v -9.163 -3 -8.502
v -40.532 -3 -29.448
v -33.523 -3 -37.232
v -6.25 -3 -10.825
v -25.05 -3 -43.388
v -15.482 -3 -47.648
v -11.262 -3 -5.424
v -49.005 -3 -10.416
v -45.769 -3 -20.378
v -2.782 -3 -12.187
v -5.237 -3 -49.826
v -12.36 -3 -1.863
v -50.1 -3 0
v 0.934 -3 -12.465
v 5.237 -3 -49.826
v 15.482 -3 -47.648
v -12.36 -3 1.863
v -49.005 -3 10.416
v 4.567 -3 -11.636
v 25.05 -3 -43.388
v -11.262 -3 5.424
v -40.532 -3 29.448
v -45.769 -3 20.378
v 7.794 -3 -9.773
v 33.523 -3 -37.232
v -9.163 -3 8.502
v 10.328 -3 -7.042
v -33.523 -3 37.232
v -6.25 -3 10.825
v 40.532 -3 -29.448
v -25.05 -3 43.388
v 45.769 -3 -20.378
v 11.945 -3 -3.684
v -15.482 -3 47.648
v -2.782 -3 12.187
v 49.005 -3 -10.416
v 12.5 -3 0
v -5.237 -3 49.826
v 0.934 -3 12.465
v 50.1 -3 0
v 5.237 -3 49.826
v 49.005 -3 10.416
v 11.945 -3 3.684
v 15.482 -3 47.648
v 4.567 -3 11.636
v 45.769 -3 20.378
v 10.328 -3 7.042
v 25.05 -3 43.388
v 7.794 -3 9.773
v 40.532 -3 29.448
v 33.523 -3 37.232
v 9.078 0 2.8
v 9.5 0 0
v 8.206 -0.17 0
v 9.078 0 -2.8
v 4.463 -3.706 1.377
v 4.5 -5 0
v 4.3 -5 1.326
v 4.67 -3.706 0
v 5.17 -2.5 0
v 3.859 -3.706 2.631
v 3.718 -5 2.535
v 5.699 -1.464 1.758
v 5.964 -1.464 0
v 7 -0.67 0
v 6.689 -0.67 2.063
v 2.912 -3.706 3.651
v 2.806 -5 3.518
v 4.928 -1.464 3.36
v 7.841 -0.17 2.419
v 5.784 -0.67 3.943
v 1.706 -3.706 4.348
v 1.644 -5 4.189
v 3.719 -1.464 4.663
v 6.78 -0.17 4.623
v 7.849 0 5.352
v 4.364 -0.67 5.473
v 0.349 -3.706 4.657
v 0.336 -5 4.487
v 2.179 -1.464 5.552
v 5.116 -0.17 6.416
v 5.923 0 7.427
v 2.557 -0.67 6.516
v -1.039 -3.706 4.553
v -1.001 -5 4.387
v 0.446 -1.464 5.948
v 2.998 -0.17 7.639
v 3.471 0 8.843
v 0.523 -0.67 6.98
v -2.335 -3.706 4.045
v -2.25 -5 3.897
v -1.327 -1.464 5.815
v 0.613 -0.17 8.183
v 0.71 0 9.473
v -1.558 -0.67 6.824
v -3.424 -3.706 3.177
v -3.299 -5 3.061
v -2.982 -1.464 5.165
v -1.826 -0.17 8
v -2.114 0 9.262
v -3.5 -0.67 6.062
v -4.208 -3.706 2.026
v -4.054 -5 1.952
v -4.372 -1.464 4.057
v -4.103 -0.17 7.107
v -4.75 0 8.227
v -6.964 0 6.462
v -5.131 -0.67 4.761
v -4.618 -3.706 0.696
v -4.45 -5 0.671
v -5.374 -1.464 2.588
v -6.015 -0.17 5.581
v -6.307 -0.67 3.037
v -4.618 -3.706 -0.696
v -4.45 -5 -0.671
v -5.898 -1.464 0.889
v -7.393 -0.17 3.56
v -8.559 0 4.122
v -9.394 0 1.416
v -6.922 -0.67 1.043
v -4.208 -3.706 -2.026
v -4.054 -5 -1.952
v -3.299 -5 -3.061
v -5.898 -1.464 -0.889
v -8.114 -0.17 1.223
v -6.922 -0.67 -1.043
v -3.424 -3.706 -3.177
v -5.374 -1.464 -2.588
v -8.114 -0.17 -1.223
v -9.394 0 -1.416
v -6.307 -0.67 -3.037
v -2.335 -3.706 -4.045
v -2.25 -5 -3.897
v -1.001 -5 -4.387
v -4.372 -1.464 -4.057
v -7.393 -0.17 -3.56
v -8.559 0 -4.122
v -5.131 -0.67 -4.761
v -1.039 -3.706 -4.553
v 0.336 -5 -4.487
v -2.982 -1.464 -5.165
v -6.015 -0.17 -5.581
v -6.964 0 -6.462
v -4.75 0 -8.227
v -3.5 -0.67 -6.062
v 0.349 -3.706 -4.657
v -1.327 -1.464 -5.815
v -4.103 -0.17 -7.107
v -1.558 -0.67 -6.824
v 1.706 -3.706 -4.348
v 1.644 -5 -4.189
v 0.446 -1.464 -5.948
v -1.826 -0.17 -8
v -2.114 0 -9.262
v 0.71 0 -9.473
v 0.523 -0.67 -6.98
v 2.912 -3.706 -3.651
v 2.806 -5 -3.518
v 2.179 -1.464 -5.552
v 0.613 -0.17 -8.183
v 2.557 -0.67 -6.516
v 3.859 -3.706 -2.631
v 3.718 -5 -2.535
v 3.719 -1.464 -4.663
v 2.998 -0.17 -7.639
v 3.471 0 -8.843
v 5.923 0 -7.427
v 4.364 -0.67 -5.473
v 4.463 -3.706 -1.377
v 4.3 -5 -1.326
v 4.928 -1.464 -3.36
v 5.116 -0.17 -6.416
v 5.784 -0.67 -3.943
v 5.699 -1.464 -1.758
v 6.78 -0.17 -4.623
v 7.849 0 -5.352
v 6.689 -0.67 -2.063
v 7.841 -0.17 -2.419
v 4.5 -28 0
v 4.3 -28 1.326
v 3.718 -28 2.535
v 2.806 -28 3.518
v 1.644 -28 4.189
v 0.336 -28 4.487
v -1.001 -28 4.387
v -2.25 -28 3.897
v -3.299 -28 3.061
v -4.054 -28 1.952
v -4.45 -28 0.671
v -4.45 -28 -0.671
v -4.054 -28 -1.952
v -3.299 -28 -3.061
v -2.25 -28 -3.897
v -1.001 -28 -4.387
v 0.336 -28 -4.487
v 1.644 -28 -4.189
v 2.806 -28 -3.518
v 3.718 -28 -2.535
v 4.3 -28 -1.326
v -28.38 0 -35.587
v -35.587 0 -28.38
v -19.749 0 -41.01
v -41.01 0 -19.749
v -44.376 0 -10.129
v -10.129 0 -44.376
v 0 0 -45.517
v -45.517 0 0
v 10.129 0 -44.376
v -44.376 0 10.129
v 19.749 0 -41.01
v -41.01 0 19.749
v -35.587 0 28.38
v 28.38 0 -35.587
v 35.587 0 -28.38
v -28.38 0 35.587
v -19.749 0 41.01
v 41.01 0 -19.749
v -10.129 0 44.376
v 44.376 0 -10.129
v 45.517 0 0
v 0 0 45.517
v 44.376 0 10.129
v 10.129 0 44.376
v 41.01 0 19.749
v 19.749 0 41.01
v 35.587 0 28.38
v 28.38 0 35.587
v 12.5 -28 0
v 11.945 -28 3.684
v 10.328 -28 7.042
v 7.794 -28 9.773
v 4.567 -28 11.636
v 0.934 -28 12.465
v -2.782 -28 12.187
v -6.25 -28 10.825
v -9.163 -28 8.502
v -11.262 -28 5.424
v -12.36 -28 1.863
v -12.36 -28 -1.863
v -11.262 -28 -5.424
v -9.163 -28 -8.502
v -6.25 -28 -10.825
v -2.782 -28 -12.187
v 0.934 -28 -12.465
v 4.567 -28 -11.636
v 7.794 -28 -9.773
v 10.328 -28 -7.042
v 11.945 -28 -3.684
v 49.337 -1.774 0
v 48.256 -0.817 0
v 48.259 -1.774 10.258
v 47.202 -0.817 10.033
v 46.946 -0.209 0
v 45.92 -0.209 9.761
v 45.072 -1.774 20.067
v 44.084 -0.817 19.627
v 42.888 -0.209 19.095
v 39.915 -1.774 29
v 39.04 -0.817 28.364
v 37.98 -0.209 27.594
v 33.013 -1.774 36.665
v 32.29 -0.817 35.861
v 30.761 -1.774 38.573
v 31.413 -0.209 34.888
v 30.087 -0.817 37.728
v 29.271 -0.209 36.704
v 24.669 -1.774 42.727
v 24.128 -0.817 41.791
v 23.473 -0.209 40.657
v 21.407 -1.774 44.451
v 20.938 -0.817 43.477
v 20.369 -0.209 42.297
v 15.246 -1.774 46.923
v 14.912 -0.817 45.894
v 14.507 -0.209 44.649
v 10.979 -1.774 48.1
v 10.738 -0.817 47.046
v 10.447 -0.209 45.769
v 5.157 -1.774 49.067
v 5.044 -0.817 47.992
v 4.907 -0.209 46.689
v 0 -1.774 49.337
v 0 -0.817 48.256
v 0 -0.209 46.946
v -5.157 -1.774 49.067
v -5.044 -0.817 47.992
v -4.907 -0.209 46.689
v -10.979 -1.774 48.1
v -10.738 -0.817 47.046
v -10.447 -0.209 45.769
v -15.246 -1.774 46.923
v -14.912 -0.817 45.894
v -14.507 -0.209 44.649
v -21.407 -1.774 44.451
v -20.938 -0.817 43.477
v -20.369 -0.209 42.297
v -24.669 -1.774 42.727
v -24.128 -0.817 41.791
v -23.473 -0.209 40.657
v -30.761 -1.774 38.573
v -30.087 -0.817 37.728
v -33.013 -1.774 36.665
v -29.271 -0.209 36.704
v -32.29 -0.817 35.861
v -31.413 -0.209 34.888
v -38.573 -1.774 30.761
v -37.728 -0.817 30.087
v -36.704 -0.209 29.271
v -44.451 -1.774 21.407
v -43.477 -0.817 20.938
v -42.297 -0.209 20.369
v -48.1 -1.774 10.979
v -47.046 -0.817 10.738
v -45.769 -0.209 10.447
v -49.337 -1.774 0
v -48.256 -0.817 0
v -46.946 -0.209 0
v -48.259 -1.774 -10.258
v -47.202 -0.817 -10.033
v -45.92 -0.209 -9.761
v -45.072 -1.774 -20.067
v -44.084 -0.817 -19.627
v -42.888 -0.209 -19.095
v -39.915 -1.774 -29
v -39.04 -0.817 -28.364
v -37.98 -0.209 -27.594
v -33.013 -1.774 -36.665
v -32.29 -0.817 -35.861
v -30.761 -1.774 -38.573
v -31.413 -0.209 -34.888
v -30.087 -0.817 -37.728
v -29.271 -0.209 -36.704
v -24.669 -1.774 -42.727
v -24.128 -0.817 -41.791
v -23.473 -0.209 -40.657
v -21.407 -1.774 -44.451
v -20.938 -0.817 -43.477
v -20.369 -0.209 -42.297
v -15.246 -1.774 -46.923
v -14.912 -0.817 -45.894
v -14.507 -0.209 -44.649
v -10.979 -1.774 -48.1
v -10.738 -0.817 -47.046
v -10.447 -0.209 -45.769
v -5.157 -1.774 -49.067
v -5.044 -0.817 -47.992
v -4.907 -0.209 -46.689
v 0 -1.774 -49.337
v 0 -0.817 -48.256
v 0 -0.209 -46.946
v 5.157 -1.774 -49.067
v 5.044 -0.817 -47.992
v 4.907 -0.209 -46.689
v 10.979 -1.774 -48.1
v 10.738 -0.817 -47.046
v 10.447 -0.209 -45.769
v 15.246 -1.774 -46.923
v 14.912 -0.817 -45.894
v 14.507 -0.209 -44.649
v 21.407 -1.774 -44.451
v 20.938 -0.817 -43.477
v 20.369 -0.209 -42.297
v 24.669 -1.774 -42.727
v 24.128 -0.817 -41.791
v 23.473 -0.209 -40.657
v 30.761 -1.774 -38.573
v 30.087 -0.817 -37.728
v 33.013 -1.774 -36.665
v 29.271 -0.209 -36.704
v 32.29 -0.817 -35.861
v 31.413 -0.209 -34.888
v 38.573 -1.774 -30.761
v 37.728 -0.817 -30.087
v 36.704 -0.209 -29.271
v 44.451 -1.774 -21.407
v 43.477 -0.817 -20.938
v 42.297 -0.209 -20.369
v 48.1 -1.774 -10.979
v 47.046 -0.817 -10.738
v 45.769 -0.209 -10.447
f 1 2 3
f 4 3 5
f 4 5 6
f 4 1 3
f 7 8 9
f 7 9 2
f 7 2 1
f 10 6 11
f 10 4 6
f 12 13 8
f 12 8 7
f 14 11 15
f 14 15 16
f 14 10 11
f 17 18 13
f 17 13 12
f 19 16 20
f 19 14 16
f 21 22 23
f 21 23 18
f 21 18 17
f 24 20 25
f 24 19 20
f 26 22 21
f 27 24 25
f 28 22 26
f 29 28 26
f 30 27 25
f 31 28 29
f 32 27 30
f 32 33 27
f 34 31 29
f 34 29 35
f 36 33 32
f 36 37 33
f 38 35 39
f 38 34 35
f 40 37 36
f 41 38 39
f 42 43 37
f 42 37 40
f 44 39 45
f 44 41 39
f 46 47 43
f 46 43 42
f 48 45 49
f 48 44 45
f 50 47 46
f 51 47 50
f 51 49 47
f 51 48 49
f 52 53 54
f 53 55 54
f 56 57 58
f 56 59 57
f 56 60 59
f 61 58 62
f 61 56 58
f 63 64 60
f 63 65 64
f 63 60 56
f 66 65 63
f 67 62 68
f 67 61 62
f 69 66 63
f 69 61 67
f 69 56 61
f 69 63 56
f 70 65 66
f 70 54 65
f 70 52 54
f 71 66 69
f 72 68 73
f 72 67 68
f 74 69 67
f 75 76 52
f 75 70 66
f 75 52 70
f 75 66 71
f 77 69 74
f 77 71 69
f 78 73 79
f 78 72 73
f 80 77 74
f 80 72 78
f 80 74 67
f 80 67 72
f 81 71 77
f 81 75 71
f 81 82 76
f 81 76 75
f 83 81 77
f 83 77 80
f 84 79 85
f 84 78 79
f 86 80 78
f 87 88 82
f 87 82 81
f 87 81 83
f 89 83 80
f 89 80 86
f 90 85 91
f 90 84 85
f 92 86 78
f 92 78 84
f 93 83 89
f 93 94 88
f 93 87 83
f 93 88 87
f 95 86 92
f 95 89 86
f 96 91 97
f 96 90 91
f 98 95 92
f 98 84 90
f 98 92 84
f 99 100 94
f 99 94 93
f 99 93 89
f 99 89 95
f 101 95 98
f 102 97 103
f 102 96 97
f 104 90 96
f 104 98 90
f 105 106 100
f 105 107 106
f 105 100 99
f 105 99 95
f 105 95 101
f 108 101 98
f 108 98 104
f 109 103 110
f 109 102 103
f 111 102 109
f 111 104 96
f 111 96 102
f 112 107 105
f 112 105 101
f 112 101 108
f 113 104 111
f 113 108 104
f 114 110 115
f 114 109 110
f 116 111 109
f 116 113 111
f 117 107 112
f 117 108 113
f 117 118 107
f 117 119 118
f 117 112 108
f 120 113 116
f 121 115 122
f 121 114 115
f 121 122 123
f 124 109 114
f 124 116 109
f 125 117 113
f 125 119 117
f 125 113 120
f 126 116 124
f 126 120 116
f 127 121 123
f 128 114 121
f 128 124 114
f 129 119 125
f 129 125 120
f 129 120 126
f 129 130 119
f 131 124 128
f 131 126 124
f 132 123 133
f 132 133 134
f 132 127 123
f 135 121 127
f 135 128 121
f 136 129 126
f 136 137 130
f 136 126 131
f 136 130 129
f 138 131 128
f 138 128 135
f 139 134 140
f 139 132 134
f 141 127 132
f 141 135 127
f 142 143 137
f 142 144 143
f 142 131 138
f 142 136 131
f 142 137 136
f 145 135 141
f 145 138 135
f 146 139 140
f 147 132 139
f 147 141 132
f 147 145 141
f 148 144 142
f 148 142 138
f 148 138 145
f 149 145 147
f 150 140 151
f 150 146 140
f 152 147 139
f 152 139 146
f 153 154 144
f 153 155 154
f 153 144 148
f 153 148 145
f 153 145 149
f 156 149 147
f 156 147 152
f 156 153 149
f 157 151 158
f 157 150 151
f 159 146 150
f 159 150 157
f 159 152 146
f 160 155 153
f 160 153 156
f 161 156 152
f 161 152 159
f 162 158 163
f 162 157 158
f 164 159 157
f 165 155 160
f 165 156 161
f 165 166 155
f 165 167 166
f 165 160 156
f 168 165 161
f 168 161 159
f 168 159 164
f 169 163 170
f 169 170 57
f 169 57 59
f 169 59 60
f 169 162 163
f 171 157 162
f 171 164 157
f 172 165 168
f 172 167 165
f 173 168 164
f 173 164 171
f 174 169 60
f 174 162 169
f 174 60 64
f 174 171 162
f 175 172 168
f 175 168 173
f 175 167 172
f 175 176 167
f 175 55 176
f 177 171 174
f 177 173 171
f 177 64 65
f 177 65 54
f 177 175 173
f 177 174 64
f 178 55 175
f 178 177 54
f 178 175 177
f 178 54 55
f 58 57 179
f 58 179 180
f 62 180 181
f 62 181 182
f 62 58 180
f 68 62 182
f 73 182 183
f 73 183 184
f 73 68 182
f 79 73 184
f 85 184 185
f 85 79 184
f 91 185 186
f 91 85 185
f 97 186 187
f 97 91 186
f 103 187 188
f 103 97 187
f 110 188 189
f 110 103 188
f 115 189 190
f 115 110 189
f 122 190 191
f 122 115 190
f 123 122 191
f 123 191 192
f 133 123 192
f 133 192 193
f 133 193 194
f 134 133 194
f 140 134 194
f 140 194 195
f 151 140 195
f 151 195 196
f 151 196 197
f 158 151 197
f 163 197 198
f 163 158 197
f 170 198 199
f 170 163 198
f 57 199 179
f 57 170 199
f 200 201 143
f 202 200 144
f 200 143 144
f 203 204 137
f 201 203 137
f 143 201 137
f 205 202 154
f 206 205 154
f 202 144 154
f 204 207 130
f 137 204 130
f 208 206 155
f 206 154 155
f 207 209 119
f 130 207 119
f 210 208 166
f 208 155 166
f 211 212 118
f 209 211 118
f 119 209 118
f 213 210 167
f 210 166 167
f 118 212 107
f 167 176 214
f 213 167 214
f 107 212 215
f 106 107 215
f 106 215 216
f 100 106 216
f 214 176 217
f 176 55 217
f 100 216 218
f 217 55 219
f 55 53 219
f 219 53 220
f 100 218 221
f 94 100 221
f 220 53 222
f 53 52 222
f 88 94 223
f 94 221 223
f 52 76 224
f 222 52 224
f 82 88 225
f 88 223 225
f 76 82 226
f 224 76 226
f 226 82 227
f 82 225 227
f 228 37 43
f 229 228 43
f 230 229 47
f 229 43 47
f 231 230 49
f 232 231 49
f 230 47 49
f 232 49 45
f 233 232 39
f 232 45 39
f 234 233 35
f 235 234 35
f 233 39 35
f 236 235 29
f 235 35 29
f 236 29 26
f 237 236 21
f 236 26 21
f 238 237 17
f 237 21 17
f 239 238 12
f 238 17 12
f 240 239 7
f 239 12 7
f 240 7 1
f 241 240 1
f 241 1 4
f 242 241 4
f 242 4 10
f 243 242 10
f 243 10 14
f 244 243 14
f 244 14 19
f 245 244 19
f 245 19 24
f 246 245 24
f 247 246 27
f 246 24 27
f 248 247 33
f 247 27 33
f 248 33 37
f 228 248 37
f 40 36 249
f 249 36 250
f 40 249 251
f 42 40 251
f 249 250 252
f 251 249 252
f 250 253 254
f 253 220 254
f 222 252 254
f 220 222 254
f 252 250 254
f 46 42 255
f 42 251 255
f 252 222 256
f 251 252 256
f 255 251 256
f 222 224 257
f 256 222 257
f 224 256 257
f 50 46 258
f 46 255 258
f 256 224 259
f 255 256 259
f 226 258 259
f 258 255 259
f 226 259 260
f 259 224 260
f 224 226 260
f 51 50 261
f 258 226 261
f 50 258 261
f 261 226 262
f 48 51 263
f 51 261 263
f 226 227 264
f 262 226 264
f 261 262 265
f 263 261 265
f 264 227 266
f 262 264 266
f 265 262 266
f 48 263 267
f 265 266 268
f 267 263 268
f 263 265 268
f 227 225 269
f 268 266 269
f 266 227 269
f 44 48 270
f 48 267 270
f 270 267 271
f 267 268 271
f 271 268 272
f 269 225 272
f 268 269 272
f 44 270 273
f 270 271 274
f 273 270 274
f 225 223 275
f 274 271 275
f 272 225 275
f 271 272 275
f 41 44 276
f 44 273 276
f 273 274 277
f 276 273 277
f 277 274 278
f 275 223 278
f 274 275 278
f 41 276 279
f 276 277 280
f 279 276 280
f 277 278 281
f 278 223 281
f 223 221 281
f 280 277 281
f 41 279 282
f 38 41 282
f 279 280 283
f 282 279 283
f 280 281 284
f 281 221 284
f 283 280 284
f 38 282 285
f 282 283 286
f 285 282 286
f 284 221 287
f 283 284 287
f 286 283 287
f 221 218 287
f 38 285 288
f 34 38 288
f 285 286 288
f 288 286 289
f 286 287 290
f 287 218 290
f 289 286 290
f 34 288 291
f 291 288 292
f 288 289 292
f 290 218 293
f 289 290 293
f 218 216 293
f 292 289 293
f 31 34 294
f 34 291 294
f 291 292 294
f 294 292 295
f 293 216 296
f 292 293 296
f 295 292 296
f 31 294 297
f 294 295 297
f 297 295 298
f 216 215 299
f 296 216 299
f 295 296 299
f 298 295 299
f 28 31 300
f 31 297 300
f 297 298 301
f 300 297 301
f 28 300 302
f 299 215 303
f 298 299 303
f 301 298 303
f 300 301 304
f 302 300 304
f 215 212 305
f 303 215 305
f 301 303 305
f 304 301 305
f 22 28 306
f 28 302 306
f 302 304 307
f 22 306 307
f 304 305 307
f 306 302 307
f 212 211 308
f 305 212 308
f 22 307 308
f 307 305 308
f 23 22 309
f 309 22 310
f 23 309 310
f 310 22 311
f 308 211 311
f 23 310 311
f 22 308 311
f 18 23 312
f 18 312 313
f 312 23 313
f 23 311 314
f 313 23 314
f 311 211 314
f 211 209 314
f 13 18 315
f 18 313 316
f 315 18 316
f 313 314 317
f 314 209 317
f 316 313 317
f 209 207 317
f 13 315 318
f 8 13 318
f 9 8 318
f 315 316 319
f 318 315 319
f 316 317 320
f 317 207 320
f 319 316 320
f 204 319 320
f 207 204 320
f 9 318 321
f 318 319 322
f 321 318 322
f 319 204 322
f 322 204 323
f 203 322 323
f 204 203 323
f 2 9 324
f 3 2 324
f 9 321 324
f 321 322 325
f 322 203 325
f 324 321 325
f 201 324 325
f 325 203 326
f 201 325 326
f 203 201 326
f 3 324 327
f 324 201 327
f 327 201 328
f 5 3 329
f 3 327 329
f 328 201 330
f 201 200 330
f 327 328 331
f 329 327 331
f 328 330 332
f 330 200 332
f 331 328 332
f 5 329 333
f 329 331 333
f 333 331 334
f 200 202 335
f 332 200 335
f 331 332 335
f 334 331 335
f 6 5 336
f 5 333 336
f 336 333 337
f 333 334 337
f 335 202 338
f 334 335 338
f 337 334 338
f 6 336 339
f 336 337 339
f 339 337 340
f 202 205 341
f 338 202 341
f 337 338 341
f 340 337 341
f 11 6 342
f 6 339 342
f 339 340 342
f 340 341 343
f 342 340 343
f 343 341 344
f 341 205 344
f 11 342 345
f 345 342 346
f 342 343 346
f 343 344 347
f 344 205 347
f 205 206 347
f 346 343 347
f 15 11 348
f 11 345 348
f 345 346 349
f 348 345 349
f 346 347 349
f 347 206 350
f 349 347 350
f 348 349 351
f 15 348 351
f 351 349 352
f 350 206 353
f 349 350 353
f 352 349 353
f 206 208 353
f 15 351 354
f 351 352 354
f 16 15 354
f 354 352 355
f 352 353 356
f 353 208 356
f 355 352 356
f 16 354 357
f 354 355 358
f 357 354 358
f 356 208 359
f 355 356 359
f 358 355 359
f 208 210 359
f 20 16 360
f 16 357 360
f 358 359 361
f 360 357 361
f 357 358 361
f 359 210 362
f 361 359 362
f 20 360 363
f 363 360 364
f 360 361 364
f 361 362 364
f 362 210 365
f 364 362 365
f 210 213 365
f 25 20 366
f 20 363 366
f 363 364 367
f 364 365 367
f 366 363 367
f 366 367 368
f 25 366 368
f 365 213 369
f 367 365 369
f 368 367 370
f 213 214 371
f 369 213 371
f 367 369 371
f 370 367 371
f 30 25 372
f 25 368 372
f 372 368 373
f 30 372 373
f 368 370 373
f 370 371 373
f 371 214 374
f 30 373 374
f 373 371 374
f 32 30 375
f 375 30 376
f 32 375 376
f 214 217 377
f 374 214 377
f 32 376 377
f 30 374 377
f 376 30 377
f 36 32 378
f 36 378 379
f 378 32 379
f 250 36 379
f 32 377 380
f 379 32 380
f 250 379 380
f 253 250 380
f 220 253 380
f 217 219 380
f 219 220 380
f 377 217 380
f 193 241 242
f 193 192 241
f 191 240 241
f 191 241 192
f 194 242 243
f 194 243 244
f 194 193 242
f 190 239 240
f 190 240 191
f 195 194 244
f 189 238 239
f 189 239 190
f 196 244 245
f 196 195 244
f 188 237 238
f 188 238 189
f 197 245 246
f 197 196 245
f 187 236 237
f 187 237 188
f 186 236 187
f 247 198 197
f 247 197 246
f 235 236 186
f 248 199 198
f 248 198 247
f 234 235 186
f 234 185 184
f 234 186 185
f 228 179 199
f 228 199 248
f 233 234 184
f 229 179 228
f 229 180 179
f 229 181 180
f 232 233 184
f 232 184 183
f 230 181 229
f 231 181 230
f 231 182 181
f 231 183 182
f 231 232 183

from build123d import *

# Parameters (mm, degrees)
F0_R     = 50.1
F0_R_2   = 4.5
F1_DEPTH = 3
F2_R     = 12.5
F2_R_2   = 4.5
F3_DEPTH = 25


# Not quite as in the source:
# - a fillet or chamfer that OpenCascade refuses, or shapes differently, is made with other operations: its cross-section is extruded or revolved along the edge and cut away or added


with BuildPart() as f1:
    # F0 (on Front) → F1 (new body)
    with BuildSketch(Plane.XZ):
        Circle(F0_R)
        Circle(F0_R_2, mode=Mode.SUBTRACT)
    extrude(amount=F1_DEPTH)

    # F2 (on face) → F3 (join)
    with BuildSketch(Plane.XZ.offset(3)):
        Circle(F2_R)
        Circle(F2_R_2, mode=Mode.SUBTRACT)
    extrude(amount=F3_DEPTH)

    # F4: fillet of radius 5 on 2 edges, made by hand

    # F4_s1 → F4_t2 (revolve, cut)
    with BuildSketch(Plane.XY):
        with BuildLine():
            ThreePointArc((50.1, -3), (48.2560370926, -0.8166998673), (45.517424305, 0))
            Line((45.517424305, 0), (50.1, 0))
            Line((50.1, 0), (50.1, -3))
        make_face()
    revolve(axis=Axis((0, 0, 0), (0, -1, 0)), mode=Mode.SUBTRACT)

    # F4_s3 → F4_t4 (revolve, cut)
    with BuildSketch(Plane.XY):
        with BuildLine():
            ThreePointArc((4.5, -5), (5.9644660941, -1.4644660941), (9.5, 0))
            Line((9.5, 0), (4.5, 0))
            Line((4.5, 0), (4.5, -5))
        make_face()
    revolve(axis=Axis((0, 0, 0), (0, -1, 0)), mode=Mode.SUBTRACT)


solid = f1.part
